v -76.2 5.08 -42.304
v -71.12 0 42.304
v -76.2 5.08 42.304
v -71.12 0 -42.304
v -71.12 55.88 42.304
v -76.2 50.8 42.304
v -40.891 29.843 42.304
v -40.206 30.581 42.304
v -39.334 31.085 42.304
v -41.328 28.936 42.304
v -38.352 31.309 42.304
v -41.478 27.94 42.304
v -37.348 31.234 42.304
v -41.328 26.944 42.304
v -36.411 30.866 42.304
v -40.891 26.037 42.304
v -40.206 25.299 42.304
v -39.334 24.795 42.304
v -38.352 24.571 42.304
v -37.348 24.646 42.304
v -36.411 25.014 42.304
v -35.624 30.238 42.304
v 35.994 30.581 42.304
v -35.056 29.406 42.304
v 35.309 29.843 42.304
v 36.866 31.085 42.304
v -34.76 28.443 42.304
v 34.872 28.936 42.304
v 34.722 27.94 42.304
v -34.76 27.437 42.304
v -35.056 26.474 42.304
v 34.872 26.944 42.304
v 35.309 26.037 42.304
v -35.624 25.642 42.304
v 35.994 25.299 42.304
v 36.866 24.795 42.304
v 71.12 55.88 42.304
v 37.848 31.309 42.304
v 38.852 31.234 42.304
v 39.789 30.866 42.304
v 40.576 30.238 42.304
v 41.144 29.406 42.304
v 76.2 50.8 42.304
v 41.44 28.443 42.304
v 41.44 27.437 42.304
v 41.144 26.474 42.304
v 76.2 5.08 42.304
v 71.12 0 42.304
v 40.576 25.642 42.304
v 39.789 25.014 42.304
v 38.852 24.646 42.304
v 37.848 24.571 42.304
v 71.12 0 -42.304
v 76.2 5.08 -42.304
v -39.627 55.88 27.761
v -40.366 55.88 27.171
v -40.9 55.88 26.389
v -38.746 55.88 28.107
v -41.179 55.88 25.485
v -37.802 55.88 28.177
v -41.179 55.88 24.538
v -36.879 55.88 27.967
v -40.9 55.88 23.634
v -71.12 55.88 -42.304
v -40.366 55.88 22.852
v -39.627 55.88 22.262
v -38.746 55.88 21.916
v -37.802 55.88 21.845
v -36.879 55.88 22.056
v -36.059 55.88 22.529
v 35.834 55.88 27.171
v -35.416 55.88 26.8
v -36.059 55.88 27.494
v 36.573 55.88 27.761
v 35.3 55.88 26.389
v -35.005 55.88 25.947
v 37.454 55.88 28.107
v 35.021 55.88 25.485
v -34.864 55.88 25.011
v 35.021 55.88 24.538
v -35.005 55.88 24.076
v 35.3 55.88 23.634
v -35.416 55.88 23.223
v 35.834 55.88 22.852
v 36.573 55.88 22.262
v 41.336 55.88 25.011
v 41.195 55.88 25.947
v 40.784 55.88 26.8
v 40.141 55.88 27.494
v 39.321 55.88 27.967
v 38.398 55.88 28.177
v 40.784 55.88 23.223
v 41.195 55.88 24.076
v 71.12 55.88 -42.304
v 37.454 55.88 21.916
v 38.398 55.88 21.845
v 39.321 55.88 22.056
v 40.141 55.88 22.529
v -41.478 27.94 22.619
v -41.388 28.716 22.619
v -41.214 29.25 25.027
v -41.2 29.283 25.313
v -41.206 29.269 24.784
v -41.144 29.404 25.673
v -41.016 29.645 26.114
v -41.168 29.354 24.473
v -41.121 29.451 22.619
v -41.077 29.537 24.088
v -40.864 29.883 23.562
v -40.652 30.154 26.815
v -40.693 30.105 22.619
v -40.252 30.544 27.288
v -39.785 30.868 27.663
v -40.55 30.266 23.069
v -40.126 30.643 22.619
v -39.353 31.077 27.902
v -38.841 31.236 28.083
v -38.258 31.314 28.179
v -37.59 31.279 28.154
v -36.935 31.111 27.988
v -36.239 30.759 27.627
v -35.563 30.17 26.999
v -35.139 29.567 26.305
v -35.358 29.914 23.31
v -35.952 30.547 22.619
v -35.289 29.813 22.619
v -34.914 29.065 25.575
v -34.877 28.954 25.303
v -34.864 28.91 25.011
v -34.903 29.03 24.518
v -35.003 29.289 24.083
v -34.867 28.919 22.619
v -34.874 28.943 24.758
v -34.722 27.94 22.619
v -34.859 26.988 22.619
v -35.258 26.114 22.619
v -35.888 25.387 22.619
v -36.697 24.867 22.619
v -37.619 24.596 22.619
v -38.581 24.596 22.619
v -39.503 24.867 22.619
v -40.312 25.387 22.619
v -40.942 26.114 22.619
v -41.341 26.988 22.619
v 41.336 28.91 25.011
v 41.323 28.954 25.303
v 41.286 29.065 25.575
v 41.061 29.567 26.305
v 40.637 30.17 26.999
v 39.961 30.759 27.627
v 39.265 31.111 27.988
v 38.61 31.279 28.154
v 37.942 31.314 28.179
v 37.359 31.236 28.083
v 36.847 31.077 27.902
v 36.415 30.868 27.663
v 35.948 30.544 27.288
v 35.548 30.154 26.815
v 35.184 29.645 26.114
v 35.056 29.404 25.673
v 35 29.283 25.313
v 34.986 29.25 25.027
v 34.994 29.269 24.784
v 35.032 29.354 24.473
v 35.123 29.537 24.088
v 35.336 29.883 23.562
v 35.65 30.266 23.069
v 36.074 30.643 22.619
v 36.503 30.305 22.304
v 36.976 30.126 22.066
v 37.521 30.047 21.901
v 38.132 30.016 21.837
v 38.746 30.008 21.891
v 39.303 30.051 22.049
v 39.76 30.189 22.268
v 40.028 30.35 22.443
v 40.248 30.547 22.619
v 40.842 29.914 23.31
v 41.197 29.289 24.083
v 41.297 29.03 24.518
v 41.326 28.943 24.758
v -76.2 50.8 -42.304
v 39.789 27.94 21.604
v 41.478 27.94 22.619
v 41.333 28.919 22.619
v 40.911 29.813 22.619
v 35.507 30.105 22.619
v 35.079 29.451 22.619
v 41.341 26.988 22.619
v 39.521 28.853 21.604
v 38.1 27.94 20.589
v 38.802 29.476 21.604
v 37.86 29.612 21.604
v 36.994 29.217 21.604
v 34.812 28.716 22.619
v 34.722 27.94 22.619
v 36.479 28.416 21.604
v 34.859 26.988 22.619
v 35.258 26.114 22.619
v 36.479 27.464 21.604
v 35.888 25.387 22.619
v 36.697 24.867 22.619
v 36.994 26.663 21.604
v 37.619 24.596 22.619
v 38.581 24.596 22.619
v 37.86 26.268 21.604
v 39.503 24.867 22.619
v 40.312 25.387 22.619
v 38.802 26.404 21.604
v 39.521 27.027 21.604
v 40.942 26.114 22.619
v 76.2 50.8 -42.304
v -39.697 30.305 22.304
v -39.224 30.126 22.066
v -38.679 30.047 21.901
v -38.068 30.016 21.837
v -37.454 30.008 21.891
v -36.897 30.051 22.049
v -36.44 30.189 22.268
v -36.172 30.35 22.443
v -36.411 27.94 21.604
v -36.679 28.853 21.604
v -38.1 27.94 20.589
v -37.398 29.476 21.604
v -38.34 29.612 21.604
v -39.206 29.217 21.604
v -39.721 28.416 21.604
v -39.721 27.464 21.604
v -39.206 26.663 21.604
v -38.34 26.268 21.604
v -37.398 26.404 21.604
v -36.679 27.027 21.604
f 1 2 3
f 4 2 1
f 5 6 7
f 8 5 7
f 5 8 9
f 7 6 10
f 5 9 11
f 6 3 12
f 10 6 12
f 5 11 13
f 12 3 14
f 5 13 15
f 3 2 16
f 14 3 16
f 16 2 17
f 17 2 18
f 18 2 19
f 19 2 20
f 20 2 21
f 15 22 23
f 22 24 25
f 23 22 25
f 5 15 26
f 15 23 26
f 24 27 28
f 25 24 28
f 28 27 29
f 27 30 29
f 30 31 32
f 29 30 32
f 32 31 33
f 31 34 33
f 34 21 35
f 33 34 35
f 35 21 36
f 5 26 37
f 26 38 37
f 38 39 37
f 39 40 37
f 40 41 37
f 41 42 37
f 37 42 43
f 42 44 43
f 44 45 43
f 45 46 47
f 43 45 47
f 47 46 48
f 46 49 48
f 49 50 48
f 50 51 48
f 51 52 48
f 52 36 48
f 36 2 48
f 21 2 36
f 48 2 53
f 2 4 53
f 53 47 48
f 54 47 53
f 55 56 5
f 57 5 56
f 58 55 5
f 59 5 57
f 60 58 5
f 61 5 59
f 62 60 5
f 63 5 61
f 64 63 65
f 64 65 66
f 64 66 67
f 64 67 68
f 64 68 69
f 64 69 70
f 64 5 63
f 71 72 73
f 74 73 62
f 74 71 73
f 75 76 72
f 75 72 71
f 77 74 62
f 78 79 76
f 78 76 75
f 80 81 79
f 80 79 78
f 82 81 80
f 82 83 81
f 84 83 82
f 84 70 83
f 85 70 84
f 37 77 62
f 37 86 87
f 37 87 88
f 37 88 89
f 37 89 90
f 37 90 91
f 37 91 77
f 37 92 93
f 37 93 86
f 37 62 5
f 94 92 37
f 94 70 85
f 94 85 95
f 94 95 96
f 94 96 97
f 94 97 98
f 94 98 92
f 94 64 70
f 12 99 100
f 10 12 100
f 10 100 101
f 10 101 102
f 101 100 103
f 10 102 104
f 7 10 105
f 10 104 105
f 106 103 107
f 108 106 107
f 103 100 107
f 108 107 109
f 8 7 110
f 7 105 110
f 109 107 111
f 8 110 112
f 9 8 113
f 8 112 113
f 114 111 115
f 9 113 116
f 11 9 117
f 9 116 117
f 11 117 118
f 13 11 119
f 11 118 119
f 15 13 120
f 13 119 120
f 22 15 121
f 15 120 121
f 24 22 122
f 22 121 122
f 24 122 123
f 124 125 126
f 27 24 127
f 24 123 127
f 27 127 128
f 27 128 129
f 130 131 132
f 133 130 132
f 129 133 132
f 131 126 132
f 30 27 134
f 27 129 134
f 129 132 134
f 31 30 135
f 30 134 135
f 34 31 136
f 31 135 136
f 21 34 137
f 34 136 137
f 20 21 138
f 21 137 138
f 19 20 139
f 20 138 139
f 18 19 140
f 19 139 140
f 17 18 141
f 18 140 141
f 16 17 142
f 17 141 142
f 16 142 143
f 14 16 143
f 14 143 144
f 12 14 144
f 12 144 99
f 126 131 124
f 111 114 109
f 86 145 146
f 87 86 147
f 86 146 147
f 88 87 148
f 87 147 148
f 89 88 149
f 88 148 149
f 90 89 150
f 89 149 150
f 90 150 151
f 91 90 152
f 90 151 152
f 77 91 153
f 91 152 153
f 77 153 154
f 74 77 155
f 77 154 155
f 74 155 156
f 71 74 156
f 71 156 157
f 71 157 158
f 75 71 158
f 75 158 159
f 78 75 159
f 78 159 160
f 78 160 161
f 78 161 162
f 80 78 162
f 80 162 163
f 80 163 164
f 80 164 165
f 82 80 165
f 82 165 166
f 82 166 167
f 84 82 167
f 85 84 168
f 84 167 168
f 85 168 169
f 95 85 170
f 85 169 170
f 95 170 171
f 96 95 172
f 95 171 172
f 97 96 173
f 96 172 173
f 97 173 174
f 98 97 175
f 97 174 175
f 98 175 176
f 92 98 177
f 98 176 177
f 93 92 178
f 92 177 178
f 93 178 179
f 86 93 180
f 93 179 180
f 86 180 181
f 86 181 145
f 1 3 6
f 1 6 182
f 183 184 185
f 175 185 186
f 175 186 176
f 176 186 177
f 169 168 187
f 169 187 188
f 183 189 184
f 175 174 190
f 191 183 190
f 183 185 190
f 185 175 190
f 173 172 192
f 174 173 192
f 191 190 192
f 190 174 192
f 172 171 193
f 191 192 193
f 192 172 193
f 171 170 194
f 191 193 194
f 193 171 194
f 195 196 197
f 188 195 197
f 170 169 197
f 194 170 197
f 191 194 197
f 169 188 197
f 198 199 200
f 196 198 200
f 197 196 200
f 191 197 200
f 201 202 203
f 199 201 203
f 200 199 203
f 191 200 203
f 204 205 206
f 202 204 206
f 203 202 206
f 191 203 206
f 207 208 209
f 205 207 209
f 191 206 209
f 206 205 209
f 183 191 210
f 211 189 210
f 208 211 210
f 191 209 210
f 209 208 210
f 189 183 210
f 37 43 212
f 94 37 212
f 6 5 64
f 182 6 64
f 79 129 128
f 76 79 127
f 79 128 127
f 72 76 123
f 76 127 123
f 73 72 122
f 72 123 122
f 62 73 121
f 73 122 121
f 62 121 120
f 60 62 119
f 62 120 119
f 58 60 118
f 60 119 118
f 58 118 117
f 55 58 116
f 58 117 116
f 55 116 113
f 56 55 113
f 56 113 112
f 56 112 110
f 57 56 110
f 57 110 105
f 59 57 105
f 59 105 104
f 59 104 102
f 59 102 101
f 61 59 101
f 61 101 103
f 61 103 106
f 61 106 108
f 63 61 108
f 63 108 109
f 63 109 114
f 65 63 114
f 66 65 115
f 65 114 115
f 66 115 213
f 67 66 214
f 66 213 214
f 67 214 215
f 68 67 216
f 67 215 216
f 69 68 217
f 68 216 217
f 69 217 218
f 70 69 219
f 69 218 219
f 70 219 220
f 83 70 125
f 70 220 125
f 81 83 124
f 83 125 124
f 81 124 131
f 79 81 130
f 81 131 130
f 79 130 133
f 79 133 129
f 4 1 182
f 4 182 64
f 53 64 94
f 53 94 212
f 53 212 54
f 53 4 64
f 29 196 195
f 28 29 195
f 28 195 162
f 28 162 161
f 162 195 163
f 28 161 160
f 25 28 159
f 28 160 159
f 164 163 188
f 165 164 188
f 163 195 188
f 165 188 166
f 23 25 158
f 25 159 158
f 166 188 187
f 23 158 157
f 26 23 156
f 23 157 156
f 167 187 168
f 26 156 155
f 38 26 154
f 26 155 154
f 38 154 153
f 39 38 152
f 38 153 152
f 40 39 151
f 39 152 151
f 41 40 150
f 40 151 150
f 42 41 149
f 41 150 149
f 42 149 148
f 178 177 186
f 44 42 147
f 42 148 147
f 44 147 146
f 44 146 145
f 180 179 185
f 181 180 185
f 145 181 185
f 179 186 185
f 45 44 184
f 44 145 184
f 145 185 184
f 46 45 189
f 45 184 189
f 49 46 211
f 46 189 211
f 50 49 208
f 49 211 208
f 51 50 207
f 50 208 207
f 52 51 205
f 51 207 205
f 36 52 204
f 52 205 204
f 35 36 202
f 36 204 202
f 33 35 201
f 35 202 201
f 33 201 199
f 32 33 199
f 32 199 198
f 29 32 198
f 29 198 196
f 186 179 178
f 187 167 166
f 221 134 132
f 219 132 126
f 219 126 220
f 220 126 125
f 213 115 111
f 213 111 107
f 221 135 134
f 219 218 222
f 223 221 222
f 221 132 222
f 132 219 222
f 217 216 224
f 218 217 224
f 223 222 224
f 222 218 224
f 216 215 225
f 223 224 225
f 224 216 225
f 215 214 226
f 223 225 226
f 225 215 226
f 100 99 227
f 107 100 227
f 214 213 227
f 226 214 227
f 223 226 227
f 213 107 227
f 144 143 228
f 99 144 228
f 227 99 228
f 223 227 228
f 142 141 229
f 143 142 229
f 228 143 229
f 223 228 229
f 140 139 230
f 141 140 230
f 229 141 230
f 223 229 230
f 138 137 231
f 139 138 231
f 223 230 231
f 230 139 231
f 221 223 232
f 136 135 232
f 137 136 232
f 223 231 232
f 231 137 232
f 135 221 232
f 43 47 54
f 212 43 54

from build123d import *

# Parameters (mm, degrees)
SKETCH1_W                              = 152.4
SKETCH1_H                              = 84.6074
EXTRUDE1_DEPTH                         = 55.88
TAPPED_HOLE_FOR_1_4_20_HELICOIL1_D     = 6.7564
TAPPED_HOLE_FOR_1_4_20_HELICOIL1_DEPTH = 19.685
TAPPED_HOLE_FOR_1_4_20_HELICOIL1_TIP   = 2.029827343
F_1_4_0_25_DIAMETER_HOLE1_D            = 6.35
F_1_4_0_25_DIAMETER_HOLE1_DEPTH        = 27.94
F_1_4_0_25_DIAMETER_HOLE1_TIP          = 1.907732465
CHAMFER1_SIZE                          = 5.08


with BuildPart() as part:
    # Sketch1 → Extrude1 (new body)
    with BuildSketch(Plane(origin=(0, 0, 0), x_dir=(1, 0, 0), z_dir=(0, 1, 0))):
        Rectangle(SKETCH1_W, SKETCH1_H)
    extrude(amount=EXTRUDE1_DEPTH)

    # Tapped Hole for 1/4-20 Helicoil1
    with Locations(Plane.XY.offset(42.3037)):
        with Locations((-38.1, 27.94), (38.1, 27.94)):
            Hole(TAPPED_HOLE_FOR_1_4_20_HELICOIL1_D / 2, depth=TAPPED_HOLE_FOR_1_4_20_HELICOIL1_DEPTH)
            with Locations((0, 0, -(TAPPED_HOLE_FOR_1_4_20_HELICOIL1_DEPTH + TAPPED_HOLE_FOR_1_4_20_HELICOIL1_TIP / 2))):  # 118° drill point
                Cone(0, TAPPED_HOLE_FOR_1_4_20_HELICOIL1_D / 2, TAPPED_HOLE_FOR_1_4_20_HELICOIL1_TIP, mode=Mode.SUBTRACT)

    # 1/4 (0.25) Diameter Hole1
    with Locations(Plane(origin=(0, 55.88, 0), x_dir=(-1, 0, 0), z_dir=(0, 1, 0))):
        with Locations((-38.160987939, 25.011375754), (38.039012061, 25.011375754)):
            Hole(F_1_4_0_25_DIAMETER_HOLE1_D / 2, depth=F_1_4_0_25_DIAMETER_HOLE1_DEPTH)
            with Locations((0, 0, -(F_1_4_0_25_DIAMETER_HOLE1_DEPTH + F_1_4_0_25_DIAMETER_HOLE1_TIP / 2))):  # 118° drill point
                Cone(0, F_1_4_0_25_DIAMETER_HOLE1_D / 2, F_1_4_0_25_DIAMETER_HOLE1_TIP, mode=Mode.SUBTRACT)

    # Chamfer1
    chamfer1_edges = [part.edges().sort_by_distance(p)[0] for p in [
        (76.2, 55.88, 0),
        (-76.2, 55.88, 0),
        (76.2, 0, 0),
        (-76.2, 0, 0),
    ]]
    chamfer(chamfer1_edges, length=CHAMFER1_SIZE)


solid = part.part
